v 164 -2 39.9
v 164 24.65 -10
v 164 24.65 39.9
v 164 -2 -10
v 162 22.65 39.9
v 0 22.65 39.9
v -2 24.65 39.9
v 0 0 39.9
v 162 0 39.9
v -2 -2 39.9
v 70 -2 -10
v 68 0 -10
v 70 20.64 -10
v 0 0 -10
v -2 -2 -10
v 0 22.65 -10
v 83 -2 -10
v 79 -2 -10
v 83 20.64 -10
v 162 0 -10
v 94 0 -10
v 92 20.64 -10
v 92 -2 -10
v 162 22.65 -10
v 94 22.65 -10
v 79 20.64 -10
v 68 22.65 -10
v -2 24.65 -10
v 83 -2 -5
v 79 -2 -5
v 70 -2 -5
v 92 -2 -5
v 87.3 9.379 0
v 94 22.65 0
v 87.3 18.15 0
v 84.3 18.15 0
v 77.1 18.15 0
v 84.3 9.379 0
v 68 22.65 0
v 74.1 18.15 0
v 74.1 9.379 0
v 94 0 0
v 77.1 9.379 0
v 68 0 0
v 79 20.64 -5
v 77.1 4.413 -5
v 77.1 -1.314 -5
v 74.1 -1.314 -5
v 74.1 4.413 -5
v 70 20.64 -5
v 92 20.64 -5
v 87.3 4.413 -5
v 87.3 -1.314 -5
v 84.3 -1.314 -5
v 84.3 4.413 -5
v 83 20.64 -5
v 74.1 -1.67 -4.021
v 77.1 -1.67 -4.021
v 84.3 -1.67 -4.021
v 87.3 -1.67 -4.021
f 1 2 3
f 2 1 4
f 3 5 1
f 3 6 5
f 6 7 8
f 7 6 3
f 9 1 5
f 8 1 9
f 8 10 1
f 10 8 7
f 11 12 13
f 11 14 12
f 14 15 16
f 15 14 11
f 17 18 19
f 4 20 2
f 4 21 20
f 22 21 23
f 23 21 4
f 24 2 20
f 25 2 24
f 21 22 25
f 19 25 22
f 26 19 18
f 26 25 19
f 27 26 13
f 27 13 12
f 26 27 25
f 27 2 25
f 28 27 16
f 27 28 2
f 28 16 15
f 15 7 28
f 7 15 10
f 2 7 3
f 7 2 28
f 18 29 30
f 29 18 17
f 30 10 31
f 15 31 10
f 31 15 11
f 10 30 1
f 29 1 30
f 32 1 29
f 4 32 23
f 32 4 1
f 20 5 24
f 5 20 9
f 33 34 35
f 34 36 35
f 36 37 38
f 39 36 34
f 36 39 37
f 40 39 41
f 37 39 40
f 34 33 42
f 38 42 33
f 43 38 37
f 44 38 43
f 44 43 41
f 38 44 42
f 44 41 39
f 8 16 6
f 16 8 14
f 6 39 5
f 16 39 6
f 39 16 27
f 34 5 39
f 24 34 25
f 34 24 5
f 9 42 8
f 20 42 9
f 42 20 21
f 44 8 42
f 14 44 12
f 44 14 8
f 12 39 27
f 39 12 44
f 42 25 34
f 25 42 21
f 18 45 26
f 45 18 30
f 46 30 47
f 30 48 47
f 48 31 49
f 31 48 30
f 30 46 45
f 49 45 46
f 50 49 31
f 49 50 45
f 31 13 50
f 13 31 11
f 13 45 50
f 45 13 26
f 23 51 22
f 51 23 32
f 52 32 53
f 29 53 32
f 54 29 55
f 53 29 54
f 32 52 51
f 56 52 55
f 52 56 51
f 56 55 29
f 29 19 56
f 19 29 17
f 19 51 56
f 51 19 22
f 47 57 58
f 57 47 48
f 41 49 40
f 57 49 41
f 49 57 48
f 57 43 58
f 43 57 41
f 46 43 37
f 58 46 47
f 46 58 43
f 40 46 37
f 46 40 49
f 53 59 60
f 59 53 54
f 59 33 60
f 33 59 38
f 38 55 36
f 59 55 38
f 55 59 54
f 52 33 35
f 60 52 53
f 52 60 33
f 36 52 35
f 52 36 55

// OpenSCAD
// New 3DS XL charging dock (device cannot be used while in it)
// beta - has lots of room for improvement

outer_w = 72.6;
outer_spacing = 68;
contact_w = 2.5;
contact_h = 3.5;
contact_spacing = 10.2;
inner_w = 5.1;
w = 160 + 2;
h = 21.15 + 1.5;

shell = 2;

inner_spacing = w - (2 * outer_spacing);
contact_x = outer_w;
contact_y = h - contact_h;

difference(){
	translate([-shell, -shell, -10]) cube([w+(2*shell), h+(2*shell), 40+9.9]);
	cube([w, h, 40]);
	translate([0, 0, -11]) cube([outer_spacing, h, 12]);
	translate([w-outer_spacing, 0, -11]) cube([outer_spacing, h, 12]);
	translate([outer_spacing+2, -shell-0.01, -11]) cube([inner_spacing/2-4, h, 6]);
	translate([outer_spacing+2+inner_spacing/2, -shell-0.01, -11]) cube([inner_spacing/2-4, h, 6]);
	translate([outer_w + 1.5, h - contact_h - 1, 0]) rotate([20+90, 0, 0]) cube([3, 3, 20]);
	translate([outer_w + 1.5 + contact_spacing, h - contact_h - 1, 0]) rotate([20+90, 0, 0]) cube([3, 3, 20]);
}
